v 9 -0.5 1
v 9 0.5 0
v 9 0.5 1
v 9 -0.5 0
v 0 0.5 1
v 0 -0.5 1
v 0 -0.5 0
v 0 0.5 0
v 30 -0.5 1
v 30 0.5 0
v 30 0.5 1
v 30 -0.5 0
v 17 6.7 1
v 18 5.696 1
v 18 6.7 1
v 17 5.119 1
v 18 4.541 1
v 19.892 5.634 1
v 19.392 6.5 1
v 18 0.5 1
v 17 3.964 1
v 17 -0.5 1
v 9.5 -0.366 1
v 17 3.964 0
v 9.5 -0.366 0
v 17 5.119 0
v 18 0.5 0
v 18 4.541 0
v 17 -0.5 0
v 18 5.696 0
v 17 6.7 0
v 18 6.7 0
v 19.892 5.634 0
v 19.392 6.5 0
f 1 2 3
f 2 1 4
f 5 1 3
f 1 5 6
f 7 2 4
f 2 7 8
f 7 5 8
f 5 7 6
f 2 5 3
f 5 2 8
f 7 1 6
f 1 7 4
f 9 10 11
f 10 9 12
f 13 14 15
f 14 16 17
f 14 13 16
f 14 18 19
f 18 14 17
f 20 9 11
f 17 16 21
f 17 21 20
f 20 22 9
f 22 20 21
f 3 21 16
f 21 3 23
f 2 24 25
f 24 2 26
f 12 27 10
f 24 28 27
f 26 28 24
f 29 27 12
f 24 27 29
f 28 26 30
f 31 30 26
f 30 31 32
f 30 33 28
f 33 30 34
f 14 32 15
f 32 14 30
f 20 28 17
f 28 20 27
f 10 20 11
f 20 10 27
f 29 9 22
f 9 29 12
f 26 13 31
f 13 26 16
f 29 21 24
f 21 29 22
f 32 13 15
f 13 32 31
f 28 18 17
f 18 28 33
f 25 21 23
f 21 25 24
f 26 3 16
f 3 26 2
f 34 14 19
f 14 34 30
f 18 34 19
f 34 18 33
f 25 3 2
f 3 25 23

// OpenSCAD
// nc = normally closed
module switch_nc(length, width, thickness, height)
{
    translate([0,-thickness/2,0])cube([length/2-width/2, thickness, height]);
    
    translate([(length/2+width/4),-thickness/2,0])cube([(length/2-width/4), thickness, height]);
    
    translate([(length/2+width/4-thickness),-thickness/2,0])cube([thickness, 3*width/5, height]);
    
    translate([(length/2-width/2),+thickness/2, 0])rotate([0,0,-60])cube([thickness, width, height]);
    
}

switch_nc(30, 12, 1, 1);
